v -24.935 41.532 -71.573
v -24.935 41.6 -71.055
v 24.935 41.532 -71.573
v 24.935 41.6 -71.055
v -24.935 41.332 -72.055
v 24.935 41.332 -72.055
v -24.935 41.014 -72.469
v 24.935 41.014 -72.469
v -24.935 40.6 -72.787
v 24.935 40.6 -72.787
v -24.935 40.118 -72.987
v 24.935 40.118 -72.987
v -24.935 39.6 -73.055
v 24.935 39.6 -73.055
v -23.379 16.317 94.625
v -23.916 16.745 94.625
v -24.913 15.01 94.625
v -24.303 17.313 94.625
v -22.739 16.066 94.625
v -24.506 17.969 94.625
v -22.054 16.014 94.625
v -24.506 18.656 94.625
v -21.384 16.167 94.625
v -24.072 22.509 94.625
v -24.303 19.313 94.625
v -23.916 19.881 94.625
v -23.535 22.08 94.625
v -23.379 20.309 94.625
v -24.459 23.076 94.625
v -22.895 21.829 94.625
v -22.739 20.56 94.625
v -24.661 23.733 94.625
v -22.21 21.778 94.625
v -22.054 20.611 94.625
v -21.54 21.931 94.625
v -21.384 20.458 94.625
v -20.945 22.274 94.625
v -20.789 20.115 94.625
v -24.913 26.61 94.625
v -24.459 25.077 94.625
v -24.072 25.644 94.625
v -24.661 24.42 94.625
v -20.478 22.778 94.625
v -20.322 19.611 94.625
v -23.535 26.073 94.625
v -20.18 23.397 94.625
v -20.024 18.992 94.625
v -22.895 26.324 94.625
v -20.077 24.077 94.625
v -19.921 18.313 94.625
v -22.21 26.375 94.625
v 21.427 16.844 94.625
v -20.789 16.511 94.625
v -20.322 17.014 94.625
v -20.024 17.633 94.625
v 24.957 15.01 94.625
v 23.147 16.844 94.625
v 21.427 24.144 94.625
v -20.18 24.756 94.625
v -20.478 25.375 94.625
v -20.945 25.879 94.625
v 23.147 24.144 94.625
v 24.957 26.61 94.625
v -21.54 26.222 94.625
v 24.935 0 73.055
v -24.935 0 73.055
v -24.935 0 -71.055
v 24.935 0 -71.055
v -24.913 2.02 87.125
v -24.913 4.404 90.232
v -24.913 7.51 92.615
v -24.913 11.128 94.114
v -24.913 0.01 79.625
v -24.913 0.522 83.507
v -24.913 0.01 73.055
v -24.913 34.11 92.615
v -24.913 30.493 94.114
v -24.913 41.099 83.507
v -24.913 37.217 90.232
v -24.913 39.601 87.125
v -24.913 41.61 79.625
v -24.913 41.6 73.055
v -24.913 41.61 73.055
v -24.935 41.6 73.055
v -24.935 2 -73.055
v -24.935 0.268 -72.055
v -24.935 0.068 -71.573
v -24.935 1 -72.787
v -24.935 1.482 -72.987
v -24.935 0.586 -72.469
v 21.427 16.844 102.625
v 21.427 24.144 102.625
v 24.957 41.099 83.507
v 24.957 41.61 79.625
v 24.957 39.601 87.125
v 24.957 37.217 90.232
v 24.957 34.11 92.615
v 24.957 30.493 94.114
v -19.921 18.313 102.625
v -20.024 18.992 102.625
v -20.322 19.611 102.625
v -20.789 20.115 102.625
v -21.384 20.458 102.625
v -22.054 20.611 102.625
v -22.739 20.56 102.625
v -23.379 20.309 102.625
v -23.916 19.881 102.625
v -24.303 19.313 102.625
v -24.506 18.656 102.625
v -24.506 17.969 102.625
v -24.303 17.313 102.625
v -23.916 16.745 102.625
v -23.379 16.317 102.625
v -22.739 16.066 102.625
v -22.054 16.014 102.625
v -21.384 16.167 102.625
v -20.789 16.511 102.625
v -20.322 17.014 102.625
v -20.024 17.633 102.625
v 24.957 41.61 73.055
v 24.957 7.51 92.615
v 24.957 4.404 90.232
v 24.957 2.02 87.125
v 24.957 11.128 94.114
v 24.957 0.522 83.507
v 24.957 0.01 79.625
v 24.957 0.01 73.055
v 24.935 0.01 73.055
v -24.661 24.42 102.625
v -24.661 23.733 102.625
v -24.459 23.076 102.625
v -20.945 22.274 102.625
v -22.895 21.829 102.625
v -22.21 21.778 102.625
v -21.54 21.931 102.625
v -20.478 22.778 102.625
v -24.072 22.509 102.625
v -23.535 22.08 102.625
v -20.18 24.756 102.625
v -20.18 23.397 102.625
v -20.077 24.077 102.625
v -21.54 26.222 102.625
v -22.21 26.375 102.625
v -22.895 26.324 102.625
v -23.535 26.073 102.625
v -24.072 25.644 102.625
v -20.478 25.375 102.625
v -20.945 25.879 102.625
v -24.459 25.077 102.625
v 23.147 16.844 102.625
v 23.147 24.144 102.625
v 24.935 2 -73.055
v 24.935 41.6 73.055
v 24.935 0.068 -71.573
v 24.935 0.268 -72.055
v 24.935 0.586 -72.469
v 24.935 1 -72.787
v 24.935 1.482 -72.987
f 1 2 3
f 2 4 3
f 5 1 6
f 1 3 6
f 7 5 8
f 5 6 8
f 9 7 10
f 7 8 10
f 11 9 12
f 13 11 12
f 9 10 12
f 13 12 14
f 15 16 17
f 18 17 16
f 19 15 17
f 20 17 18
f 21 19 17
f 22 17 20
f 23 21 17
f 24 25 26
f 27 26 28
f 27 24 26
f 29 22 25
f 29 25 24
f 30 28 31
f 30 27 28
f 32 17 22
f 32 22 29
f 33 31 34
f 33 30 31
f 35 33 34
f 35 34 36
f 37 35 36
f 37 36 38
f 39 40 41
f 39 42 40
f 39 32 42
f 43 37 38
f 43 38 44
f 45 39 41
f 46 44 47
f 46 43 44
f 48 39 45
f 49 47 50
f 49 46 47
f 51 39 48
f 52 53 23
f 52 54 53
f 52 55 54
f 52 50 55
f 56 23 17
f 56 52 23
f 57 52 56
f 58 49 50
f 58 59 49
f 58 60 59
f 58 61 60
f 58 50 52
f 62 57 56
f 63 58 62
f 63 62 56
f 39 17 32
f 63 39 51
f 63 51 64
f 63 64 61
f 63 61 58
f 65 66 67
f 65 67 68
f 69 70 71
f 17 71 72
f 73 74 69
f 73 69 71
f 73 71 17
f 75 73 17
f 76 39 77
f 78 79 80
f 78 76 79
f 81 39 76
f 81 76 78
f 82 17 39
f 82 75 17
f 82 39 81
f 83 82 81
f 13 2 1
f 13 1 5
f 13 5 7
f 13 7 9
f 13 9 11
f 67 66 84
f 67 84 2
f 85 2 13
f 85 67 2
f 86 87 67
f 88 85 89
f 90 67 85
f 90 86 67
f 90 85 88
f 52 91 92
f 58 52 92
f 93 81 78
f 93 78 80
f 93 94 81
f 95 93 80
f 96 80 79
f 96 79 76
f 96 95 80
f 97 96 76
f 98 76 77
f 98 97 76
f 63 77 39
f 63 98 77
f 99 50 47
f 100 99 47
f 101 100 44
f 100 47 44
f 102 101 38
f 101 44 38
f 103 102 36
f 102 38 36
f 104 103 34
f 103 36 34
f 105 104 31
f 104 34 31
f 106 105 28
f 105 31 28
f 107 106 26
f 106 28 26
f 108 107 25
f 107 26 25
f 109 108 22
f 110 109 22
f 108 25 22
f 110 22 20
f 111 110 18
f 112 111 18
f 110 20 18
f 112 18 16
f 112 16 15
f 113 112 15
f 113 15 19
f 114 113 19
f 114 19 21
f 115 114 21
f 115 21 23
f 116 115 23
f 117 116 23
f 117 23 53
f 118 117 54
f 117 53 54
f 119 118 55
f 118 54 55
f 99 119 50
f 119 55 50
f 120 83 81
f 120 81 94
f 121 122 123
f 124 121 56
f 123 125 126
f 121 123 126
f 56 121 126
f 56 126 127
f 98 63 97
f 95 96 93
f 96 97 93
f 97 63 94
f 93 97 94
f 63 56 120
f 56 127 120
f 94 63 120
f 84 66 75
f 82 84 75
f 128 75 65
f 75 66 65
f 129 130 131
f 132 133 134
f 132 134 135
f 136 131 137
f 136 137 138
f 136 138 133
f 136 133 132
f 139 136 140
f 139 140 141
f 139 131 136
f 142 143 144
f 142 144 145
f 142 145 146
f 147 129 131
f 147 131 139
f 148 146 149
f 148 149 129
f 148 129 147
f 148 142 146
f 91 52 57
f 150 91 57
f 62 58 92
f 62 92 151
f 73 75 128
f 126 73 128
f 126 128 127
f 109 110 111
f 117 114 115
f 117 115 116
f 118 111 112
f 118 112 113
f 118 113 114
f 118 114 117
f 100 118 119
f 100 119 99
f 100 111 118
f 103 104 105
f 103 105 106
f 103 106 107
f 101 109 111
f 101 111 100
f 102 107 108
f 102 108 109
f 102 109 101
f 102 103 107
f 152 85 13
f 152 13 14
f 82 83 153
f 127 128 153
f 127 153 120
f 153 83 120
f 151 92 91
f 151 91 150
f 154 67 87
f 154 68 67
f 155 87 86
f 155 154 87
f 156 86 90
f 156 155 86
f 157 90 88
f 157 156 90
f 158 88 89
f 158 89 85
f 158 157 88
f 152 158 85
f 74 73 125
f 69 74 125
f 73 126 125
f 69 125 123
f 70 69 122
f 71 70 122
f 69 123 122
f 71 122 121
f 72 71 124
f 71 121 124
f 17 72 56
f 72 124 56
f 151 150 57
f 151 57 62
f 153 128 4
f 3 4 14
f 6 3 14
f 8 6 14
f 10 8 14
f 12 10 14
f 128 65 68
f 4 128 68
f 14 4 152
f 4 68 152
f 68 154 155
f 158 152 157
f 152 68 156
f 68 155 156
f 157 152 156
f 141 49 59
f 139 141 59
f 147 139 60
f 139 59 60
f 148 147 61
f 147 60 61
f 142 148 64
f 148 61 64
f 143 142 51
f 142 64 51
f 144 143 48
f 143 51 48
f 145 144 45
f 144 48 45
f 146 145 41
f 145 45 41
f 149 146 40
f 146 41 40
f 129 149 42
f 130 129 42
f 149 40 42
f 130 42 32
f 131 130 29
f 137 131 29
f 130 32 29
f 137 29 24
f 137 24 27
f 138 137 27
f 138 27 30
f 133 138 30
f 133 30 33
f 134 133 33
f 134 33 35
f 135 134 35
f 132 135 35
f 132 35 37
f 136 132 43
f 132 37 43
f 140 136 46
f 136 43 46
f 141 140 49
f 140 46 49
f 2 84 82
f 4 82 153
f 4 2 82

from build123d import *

# Parameters (mm, degrees)
SKETCH1_W           = 49.87
SKETCH1_H           = 146.11
BOSS_EXTRUDE1_DEPTH = 41.6
SKETCH2_W           = 49.87
SKETCH2_H           = 41.6
BOSS_EXTRUDE2_DEPTH = 21.57
FILLET2_R           = 15
SKETCH6_R           = 2.305
BOSS_EXTRUDE4_DEPTH = 8
SKETCH7_R           = 2.305
BOSS_EXTRUDE5_DEPTH = 8
SKETCH8_W           = 1.72
SKETCH8_H           = 7.3
BOSS_EXTRUDE6_DEPTH = 8
FILLET3_R           = 2


with BuildPart() as part:
    # Sketch1 → Boss-Extrude1 (new body)
    with BuildSketch(Plane(origin=(0, 0, 0), x_dir=(1, 0, 0), z_dir=(0, 1, 0))):
        Rectangle(SKETCH1_W, SKETCH1_H)
    extrude(amount=BOSS_EXTRUDE1_DEPTH)

    # Sketch2 → Boss-Extrude2 (add)
    with BuildSketch(Plane.XY.offset(73.055)):
        with Locations((0.021729079, 20.81046652)):
            Rectangle(SKETCH2_W, SKETCH2_H)
    extrude(amount=BOSS_EXTRUDE2_DEPTH)

    # Fillet2
    fillet2_edges = [part.edges().sort_by_distance(p)[0] for p in [
        (0.021729079, 0.01046652, 94.625),
        (0.021729079, 41.61046652, 94.625),
    ]]
    fillet(fillet2_edges, radius=FILLET2_R)

    # Sketch6 → Boss-Extrude4 (add)
    with BuildSketch(Plane.XY.offset(94.625)):
        with Locations((-22.382137535, 24.07655878)):
            Circle(SKETCH6_R)
    extrude(amount=BOSS_EXTRUDE4_DEPTH)

    # Sketch7 → Boss-Extrude5 (add)
    with BuildSketch(Plane.XY.offset(94.625)):
        with Locations((-22.226360129, 18.312794768)):
            Circle(SKETCH7_R)
    extrude(amount=BOSS_EXTRUDE5_DEPTH)

    # Sketch8 → Boss-Extrude6 (add)
    with BuildSketch(Plane.XY.offset(94.625)):
        with Locations((22.28703356, 20.493678449)):
            Rectangle(SKETCH8_W, SKETCH8_H)
    extrude(amount=BOSS_EXTRUDE6_DEPTH)

    # Fillet3
    fillet3_edges = [part.edges().sort_by_distance(p)[0] for p in [
        (0, 41.6, -73.055),
        (0, 0, -73.055),
    ]]
    fillet(fillet3_edges, radius=FILLET3_R)


solid = part.part
